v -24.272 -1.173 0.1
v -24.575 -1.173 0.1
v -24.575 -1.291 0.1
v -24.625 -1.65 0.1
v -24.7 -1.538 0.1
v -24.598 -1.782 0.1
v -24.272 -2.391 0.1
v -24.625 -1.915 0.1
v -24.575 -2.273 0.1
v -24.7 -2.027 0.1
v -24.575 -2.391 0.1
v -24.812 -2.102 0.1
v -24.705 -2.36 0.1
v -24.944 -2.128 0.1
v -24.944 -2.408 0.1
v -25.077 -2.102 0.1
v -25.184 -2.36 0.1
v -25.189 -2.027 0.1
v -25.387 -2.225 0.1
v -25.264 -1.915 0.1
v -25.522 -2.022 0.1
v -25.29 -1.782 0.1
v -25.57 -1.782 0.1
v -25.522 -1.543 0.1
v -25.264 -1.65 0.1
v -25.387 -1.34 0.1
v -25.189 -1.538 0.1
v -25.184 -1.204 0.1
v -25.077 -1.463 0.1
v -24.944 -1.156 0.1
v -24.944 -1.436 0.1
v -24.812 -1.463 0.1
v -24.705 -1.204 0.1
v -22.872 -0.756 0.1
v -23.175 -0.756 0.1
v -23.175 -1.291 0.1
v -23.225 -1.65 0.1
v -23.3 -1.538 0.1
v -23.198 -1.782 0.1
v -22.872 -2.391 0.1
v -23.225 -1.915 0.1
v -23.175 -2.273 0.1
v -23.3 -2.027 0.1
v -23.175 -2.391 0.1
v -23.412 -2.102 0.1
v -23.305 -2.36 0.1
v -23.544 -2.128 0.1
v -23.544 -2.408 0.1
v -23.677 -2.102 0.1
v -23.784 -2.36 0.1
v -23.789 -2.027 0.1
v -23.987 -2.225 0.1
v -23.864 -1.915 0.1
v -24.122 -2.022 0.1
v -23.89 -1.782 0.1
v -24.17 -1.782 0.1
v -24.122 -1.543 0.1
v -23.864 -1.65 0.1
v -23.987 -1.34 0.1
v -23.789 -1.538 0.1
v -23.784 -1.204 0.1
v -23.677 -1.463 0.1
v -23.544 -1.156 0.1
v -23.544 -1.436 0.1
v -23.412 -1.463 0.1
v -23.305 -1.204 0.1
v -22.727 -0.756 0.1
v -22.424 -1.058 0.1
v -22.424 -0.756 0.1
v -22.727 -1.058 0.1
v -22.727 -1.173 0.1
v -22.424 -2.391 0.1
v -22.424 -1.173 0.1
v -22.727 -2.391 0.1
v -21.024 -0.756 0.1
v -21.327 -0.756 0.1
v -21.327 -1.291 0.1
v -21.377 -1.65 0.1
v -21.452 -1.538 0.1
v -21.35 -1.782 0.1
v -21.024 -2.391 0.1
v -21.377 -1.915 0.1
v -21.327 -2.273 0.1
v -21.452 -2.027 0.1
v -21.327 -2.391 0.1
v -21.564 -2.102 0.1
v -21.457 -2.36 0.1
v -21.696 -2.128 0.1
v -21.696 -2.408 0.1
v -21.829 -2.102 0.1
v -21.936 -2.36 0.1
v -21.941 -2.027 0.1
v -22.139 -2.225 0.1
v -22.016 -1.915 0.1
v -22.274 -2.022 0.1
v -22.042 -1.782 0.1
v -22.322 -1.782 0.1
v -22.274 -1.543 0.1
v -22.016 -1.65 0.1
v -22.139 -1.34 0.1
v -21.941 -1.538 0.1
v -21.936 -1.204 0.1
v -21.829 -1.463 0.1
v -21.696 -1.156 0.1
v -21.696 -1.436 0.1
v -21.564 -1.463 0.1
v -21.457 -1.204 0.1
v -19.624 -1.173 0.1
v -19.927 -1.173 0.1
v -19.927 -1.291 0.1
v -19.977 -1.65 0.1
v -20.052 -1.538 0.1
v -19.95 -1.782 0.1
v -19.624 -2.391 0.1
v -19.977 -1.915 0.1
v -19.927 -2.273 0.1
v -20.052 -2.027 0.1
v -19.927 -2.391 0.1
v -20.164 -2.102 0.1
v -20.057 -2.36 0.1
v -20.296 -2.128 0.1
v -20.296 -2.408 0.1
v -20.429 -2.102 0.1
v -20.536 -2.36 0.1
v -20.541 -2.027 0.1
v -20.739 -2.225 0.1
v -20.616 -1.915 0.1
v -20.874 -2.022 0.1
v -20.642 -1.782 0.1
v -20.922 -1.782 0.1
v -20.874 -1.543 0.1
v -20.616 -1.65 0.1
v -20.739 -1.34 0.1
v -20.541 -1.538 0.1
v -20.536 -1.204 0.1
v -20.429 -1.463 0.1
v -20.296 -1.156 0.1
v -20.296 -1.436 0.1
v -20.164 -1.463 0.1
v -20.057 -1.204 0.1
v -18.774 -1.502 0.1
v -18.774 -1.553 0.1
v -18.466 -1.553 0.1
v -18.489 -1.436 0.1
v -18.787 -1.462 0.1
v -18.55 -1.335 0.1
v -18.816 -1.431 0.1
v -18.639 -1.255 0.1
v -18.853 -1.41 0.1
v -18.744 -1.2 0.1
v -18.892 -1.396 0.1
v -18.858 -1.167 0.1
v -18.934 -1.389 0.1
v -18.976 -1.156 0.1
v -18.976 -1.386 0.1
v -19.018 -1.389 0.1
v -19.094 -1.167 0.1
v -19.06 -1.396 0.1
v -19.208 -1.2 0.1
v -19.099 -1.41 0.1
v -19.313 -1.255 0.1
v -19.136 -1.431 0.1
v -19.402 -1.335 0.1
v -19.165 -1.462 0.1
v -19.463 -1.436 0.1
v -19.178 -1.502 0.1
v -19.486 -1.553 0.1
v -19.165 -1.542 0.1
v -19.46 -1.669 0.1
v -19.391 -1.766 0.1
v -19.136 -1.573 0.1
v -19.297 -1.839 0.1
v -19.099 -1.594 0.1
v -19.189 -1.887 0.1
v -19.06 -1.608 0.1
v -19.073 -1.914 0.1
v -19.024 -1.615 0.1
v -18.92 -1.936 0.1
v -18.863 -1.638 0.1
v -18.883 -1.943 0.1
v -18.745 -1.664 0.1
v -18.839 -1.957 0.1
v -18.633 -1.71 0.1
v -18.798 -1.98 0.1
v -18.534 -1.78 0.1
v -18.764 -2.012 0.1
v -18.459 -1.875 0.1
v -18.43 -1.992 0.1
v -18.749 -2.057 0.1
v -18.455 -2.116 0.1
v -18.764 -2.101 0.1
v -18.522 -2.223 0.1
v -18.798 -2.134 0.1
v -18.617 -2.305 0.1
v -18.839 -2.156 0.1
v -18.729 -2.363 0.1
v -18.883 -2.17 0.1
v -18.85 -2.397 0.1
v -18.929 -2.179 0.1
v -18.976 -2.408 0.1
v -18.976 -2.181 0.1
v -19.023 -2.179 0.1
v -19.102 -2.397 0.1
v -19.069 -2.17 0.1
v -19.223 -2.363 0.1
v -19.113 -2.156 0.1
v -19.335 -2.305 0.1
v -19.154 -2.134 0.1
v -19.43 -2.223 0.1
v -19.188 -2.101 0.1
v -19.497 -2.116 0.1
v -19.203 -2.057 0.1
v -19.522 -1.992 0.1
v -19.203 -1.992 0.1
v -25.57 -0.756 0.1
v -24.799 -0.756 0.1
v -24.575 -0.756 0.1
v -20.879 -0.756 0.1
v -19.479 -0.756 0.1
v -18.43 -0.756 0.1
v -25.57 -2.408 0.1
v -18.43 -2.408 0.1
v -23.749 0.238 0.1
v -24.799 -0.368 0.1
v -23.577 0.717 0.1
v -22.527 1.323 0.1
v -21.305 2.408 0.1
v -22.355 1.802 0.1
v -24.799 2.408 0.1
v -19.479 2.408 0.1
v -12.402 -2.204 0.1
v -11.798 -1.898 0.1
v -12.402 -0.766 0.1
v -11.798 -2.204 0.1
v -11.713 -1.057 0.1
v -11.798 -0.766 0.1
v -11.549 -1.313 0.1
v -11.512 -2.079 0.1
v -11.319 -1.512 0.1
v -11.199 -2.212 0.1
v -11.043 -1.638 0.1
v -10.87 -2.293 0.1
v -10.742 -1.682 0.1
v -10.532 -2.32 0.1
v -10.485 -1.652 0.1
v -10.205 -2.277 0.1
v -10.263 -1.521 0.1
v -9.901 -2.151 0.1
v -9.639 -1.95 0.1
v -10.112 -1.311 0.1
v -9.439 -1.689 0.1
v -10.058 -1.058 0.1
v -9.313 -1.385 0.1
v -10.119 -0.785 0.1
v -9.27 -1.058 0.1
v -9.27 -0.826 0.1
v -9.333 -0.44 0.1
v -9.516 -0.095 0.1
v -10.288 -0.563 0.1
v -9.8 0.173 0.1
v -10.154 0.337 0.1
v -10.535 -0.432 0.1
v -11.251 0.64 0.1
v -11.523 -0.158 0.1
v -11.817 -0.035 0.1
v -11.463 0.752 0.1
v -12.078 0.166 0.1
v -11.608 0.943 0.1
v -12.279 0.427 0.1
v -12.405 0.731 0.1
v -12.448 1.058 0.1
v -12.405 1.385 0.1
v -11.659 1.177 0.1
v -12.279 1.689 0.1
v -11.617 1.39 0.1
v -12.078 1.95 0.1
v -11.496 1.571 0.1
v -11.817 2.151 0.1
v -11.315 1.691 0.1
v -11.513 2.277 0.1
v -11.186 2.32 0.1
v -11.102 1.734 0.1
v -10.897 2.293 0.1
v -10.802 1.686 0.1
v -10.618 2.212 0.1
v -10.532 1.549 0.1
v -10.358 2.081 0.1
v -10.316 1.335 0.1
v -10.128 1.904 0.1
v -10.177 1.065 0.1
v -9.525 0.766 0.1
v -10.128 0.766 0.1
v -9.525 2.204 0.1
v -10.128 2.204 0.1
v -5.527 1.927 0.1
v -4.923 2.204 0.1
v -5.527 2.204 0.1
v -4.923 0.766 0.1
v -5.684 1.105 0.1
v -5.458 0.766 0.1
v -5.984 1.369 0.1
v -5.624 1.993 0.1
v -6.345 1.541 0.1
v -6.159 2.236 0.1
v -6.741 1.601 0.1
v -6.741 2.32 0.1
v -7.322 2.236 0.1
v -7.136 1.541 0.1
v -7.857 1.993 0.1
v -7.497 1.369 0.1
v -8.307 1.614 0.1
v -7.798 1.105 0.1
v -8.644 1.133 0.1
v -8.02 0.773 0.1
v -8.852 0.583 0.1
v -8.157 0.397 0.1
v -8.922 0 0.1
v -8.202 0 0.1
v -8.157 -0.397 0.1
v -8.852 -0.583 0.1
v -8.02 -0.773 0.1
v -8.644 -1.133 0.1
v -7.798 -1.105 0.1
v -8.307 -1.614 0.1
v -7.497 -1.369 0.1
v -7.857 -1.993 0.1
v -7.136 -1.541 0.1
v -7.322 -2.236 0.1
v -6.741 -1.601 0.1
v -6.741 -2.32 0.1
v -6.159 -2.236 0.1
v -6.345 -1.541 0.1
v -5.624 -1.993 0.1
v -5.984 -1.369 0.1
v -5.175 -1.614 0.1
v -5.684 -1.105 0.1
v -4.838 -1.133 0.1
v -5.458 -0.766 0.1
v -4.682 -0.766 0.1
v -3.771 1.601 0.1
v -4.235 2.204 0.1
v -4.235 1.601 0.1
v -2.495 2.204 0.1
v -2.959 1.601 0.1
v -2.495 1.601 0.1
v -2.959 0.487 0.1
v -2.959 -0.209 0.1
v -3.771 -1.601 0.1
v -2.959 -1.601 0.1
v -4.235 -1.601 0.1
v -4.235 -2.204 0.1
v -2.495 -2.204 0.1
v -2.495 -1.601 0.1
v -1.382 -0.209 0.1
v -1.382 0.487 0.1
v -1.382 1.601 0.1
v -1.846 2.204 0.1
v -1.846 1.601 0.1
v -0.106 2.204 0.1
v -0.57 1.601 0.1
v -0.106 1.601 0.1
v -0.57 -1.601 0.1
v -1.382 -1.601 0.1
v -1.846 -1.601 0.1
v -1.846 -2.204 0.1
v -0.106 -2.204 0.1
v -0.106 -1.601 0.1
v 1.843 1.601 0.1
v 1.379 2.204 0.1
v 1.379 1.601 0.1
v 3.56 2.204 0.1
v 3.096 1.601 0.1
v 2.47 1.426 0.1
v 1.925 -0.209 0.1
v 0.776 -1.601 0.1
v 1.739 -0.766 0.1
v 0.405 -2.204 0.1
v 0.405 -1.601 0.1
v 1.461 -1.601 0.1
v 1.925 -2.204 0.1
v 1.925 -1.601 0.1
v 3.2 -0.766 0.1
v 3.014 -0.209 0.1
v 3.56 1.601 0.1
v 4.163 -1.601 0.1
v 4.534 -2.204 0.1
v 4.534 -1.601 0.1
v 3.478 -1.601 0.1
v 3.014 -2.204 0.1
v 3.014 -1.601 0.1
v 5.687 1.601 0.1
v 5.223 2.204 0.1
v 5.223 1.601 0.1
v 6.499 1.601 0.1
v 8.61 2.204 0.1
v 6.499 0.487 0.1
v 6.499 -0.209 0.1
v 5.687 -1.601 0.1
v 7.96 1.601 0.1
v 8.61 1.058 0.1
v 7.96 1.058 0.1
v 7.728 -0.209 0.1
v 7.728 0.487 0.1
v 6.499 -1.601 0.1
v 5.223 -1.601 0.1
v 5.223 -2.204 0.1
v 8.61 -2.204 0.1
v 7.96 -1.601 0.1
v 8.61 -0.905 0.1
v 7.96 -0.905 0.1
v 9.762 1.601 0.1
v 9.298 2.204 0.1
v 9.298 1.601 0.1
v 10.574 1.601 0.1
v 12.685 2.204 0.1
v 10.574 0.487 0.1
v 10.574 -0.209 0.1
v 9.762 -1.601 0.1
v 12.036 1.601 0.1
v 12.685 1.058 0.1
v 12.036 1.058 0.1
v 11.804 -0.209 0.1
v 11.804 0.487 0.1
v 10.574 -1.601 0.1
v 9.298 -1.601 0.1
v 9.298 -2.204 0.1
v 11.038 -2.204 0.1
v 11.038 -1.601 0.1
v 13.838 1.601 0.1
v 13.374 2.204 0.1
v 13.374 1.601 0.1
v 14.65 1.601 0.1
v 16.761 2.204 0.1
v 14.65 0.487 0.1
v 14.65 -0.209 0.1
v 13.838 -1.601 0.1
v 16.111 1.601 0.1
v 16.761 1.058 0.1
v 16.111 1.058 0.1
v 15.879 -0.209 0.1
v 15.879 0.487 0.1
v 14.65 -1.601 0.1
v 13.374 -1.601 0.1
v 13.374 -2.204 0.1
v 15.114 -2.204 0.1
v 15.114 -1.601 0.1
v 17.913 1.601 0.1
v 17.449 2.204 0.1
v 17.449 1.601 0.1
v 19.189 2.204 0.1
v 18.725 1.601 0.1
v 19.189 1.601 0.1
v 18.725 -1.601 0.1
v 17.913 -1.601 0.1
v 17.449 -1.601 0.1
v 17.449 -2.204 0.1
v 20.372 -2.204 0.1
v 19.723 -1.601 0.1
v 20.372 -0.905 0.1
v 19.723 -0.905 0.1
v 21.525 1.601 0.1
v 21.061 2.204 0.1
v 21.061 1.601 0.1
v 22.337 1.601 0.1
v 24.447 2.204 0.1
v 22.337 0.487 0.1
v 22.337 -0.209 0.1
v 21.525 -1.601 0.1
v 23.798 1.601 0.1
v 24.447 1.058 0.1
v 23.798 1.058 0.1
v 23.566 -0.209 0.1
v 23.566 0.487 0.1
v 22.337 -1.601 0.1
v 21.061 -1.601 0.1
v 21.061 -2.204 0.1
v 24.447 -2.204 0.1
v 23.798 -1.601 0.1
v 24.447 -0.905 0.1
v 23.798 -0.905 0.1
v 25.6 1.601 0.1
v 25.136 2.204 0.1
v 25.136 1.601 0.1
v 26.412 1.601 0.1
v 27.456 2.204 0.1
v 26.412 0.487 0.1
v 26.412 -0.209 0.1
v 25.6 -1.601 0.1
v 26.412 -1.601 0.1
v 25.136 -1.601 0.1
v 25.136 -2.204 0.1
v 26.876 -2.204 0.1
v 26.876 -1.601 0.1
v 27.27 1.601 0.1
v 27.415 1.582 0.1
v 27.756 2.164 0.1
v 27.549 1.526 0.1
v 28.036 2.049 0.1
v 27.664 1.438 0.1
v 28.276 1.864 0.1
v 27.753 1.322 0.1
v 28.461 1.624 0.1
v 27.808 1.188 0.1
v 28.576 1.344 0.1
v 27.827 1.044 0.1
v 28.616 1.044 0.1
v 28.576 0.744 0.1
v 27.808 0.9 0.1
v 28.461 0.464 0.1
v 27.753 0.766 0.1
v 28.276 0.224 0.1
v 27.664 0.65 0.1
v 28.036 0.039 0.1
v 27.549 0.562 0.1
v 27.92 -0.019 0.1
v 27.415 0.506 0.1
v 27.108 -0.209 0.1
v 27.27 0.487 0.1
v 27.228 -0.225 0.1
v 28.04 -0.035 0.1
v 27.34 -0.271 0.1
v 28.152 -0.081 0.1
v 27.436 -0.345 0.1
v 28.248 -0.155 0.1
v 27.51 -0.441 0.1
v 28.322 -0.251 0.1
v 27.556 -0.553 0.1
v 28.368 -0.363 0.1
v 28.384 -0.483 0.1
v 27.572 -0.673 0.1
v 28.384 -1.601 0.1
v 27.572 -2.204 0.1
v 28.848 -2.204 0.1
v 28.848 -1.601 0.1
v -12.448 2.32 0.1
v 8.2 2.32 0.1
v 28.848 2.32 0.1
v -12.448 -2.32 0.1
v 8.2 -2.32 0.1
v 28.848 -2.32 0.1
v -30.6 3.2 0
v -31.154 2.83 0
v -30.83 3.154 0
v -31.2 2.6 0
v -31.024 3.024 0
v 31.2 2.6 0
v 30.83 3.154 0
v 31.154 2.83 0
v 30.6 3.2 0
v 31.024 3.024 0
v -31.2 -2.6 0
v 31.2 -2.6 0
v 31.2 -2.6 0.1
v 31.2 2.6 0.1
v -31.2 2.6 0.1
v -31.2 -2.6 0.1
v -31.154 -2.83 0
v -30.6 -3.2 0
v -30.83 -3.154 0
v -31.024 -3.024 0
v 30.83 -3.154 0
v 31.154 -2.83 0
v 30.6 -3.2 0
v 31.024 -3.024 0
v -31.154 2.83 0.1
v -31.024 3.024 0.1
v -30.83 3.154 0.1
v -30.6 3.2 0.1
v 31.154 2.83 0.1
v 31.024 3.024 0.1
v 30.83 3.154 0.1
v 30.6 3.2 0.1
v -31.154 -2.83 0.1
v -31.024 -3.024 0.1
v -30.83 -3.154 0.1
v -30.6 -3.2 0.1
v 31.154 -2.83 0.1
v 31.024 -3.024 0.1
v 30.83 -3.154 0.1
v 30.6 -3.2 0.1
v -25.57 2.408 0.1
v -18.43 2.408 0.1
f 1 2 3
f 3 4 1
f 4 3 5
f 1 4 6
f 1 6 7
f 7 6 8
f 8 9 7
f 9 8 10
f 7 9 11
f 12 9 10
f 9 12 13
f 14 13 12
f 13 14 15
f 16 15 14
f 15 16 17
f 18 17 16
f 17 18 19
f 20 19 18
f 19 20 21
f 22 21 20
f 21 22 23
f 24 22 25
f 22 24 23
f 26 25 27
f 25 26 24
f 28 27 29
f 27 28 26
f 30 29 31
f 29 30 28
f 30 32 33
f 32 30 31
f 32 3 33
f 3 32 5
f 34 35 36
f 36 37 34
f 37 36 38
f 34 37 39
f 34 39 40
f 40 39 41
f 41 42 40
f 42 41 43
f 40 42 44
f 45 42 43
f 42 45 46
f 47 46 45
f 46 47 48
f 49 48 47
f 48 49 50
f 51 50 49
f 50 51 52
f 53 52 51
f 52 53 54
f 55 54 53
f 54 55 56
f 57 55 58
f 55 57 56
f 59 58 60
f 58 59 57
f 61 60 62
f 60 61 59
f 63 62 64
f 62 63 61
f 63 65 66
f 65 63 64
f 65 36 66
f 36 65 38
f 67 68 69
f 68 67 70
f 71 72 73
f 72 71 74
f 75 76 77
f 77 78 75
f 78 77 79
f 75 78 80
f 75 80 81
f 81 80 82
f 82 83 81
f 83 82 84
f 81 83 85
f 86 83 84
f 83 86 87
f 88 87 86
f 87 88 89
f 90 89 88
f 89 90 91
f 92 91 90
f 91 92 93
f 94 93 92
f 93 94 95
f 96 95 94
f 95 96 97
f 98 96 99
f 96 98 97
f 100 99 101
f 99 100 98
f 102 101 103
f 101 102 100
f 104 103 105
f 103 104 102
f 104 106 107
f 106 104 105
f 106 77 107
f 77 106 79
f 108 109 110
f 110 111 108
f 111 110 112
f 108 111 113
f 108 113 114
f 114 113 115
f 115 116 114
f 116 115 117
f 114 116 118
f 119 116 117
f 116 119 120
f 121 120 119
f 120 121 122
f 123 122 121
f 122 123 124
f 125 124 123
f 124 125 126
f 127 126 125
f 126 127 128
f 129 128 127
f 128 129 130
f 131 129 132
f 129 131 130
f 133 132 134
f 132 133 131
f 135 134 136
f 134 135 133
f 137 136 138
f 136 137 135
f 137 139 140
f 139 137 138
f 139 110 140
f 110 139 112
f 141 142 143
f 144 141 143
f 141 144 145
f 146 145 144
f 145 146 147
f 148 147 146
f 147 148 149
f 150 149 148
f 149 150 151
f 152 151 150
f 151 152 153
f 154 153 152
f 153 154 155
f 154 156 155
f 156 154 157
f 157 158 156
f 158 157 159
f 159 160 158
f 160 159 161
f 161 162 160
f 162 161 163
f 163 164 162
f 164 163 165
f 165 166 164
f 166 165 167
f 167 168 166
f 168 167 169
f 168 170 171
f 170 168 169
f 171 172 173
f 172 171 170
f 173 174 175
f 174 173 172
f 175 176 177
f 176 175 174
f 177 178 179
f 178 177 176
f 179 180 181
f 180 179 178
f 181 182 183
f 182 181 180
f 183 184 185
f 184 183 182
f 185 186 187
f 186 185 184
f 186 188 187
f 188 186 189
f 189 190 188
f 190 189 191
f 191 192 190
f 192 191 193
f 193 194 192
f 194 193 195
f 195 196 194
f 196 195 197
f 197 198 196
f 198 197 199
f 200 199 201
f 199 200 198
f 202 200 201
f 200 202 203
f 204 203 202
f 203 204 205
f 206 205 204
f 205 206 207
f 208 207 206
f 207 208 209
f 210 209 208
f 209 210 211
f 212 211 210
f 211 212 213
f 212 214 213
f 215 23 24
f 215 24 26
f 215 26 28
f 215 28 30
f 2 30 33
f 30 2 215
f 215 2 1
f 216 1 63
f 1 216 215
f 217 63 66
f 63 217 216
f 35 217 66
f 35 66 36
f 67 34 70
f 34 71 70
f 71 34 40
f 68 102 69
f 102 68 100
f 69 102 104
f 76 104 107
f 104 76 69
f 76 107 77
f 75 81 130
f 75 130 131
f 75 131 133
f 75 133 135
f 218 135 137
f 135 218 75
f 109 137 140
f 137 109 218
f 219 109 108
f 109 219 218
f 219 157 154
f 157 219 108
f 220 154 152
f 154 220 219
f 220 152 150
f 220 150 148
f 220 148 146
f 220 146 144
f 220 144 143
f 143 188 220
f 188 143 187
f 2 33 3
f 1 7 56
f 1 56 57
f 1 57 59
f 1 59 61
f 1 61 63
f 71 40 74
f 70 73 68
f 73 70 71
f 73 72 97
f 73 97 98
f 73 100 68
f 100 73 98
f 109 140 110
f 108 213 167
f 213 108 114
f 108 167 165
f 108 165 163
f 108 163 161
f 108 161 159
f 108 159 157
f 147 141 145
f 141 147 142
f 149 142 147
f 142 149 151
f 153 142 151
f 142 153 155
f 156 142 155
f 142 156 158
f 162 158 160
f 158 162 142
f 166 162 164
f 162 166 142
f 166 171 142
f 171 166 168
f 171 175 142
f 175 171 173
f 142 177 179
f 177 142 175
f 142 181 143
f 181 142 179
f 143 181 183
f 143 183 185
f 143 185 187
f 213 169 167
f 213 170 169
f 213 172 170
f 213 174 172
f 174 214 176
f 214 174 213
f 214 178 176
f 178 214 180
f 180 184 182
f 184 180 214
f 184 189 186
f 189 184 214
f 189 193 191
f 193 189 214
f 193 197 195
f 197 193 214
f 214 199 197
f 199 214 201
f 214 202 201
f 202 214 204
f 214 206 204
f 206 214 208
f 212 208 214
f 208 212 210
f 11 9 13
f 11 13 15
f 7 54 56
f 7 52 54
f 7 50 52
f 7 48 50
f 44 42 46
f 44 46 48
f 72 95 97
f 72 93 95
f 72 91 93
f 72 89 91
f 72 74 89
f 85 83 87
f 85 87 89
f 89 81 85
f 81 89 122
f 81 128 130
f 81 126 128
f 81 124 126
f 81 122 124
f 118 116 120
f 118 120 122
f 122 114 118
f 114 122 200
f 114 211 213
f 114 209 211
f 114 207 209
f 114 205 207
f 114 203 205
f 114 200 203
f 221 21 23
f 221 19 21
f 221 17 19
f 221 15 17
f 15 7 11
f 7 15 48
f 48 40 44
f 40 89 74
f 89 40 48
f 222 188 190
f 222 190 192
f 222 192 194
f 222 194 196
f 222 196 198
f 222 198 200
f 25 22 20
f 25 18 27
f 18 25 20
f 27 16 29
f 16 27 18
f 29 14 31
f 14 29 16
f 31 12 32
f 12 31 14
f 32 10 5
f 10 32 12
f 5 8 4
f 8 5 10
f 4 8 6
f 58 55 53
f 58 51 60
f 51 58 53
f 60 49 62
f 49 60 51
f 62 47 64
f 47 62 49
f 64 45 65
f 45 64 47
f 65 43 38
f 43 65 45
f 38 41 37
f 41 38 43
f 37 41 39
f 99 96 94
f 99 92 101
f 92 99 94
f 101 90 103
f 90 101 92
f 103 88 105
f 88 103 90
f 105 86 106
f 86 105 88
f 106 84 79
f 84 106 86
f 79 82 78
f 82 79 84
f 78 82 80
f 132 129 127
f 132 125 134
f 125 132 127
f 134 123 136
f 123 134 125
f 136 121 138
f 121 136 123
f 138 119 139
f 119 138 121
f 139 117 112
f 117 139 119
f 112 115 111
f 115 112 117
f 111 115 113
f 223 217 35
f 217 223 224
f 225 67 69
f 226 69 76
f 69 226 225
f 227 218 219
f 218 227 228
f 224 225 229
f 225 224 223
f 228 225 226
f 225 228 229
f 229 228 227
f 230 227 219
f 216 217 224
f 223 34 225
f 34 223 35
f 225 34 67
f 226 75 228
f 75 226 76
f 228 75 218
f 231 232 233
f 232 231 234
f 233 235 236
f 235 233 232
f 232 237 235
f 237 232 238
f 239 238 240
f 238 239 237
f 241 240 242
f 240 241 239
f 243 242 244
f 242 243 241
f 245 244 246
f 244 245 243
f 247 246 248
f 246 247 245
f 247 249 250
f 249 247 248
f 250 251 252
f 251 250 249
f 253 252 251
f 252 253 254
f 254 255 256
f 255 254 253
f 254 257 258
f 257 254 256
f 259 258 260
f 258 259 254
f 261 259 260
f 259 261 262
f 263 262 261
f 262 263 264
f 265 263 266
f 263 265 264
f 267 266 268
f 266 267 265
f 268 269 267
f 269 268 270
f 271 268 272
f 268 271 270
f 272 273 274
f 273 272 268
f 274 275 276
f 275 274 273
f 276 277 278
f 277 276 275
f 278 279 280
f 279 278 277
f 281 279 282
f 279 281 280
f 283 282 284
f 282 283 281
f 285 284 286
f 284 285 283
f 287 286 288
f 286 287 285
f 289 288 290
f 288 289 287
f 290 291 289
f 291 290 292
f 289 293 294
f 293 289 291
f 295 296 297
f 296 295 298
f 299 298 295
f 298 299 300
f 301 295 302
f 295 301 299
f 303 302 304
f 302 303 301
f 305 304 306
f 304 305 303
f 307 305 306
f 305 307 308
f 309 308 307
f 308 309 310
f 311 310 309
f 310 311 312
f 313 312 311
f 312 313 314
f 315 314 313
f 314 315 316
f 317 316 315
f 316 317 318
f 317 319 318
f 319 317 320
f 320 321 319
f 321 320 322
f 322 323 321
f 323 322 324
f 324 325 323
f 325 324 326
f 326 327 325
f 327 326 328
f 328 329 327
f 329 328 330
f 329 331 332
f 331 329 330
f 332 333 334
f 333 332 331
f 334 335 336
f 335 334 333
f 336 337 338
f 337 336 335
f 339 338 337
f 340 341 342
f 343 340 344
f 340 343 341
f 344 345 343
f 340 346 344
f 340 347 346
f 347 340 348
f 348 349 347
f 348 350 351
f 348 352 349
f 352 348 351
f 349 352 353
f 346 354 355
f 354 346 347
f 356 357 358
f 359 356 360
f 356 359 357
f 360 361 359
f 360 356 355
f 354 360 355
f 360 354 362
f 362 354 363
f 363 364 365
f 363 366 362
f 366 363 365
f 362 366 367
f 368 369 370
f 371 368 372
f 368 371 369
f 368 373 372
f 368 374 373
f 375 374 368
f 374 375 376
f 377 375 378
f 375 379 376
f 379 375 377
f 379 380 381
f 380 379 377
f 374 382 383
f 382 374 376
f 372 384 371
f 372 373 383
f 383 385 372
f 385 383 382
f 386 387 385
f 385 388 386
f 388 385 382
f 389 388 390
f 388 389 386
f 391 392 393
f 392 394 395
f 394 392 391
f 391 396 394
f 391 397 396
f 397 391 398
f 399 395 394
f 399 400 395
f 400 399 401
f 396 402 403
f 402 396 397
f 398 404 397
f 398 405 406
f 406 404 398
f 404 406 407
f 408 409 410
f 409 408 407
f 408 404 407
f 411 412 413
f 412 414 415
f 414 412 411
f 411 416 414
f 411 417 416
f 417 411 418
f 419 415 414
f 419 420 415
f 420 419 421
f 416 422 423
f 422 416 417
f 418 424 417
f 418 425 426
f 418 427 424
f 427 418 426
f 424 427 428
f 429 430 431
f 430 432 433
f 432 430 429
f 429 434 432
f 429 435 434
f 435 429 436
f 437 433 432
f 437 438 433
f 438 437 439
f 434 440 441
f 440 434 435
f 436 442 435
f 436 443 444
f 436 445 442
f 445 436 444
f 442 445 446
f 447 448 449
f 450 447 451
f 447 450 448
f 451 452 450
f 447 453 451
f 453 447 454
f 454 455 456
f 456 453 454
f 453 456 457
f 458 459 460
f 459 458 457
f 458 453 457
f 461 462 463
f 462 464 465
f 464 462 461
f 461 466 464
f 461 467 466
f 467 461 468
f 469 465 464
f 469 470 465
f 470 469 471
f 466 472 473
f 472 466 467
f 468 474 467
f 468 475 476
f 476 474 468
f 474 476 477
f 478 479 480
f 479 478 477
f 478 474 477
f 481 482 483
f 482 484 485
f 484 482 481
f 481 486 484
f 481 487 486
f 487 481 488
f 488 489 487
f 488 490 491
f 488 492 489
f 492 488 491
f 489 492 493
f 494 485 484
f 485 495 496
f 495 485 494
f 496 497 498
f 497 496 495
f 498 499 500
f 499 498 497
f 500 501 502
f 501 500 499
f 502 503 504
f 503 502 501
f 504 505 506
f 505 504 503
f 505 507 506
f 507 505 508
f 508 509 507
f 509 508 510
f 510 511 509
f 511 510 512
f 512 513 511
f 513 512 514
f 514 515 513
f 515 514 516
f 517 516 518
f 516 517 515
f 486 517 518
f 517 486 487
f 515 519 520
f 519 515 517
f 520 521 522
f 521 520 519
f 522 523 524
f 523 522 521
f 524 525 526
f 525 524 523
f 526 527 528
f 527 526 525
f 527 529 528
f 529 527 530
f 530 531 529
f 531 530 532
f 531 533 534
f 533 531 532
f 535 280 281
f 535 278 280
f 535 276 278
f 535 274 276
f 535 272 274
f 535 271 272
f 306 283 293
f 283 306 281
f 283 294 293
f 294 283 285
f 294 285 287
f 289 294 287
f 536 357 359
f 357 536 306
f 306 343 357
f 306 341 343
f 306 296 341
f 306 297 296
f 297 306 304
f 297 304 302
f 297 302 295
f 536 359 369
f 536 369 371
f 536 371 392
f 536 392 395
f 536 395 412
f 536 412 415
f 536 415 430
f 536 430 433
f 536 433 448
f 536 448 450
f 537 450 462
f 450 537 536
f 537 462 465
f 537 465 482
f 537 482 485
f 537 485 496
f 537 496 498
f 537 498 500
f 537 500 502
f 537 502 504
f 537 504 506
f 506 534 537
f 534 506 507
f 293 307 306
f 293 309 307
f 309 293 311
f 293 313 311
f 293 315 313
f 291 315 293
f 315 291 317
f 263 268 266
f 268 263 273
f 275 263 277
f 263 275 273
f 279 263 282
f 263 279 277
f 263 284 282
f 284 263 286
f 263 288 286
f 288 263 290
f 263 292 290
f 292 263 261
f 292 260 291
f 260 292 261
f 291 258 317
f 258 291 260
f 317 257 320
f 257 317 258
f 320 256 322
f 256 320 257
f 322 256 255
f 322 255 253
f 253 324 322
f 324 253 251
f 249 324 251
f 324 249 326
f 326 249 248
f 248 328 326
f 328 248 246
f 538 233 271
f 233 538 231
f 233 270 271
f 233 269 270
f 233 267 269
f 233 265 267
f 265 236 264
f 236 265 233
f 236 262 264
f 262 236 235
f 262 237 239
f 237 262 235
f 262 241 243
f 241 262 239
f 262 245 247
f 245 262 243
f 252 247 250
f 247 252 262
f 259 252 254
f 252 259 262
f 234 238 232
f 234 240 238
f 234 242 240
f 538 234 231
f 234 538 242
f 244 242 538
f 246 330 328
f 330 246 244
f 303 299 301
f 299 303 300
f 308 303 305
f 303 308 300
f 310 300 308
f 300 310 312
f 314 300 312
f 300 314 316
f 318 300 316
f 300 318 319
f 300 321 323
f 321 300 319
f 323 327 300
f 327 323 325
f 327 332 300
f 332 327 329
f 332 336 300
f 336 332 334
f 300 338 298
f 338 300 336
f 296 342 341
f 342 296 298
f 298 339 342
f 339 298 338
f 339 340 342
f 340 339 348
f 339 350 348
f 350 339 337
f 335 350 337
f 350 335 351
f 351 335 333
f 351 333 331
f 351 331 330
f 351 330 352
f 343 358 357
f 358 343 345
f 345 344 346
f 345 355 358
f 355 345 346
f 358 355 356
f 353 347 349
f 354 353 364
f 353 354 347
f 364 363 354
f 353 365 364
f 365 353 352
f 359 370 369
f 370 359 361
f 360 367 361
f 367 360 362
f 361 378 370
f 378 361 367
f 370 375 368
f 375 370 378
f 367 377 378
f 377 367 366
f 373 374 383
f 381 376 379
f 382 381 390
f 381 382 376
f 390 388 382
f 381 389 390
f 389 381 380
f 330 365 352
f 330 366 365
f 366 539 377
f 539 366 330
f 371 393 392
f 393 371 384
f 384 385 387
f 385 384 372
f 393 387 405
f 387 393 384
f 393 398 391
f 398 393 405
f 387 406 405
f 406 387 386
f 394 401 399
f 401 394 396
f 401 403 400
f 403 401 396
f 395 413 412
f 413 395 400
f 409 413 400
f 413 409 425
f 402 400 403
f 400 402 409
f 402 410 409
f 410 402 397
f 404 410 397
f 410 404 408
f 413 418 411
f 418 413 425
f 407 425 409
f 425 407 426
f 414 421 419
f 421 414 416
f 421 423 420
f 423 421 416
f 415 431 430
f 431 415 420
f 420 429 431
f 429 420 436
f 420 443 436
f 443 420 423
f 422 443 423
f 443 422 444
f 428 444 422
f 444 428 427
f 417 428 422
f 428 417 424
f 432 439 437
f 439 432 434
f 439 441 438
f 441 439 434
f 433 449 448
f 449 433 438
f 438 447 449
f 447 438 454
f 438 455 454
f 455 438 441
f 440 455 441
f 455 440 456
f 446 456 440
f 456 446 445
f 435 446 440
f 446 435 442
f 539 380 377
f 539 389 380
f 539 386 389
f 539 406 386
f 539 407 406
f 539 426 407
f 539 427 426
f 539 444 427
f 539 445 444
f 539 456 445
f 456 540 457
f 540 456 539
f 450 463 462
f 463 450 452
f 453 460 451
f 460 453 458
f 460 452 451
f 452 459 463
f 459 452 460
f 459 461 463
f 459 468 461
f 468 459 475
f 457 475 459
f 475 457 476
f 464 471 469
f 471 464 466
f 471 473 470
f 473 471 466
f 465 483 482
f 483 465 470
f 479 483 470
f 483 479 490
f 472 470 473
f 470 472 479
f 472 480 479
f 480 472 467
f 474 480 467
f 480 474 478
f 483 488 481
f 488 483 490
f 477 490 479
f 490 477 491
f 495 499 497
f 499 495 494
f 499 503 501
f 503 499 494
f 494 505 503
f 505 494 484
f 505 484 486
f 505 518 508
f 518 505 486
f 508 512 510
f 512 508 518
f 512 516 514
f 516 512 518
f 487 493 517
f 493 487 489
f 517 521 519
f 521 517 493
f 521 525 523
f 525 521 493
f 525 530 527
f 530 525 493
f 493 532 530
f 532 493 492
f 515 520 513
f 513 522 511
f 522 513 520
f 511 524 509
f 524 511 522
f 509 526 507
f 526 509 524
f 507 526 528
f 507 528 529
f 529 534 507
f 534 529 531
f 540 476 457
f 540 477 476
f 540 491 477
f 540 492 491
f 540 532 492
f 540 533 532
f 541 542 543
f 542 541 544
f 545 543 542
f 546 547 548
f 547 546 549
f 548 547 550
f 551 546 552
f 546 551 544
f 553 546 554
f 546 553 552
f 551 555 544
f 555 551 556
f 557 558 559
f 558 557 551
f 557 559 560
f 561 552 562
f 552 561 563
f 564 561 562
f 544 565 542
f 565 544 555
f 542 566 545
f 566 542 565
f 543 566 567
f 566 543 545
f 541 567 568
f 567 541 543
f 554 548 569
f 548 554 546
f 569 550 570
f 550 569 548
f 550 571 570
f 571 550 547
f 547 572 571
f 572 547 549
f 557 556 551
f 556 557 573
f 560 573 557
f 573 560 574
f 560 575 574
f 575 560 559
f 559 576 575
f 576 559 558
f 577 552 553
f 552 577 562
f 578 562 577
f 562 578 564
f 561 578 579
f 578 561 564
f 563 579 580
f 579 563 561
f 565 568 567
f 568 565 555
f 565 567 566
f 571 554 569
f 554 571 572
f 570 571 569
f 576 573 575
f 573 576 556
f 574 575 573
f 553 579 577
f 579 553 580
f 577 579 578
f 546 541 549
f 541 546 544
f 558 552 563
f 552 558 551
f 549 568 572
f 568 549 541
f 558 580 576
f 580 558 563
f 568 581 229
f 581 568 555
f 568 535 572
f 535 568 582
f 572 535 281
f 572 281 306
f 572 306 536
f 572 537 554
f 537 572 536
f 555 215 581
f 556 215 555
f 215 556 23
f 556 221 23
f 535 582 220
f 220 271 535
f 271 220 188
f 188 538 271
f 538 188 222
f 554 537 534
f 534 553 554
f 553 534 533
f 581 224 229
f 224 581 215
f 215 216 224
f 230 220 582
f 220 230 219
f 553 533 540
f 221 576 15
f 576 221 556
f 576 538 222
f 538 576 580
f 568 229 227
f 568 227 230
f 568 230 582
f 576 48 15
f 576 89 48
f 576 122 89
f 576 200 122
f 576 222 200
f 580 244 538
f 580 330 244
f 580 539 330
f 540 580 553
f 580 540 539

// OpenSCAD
use <../lib.scad>
use <../p/1-4chrd.scad>
use <../p/1-4cyli.scad>
use <../p/box3u12.scad>
use <../p/logo-adidas-box.scad>
use <../p/logo-adidas-text-box.scad>
use <../p/logo-adidas-text.scad>
use <../p/logo-adidas.scad>
use <../p/logo-schaeffler-text-box.scad>
use <../p/logo-schaeffler-text.scad>
function ldraw_lib__6148328m() = [
// 0 Sticker  0.8 x  7.8 with White Adidas and Schaeffler Logos on Dark Grey Background
// 0 Name: 6148328m.dat
// 0 Author: Massimo Maso [Sirio]
// 0 !LDRAW_ORG Part UPDATE 2025-03
// 0 !LICENSE Licensed under CC BY 4.0 : see CAreadme.txt
// 
// 0 BFC CERTIFY CCW
  [0,"BFC","CERTIFY"],
  [0,"BFC","CCW"],
// 
// 0 !KEYWORDS 917K, 919, Bricklink 75876stk01, Brickowl 852010, Hybrid, Pit Lane
// 0 !KEYWORDS Porsche, Rebrickable 26357, set 75876, Speed Champions
// 
// 0 !HISTORY 2025-03-30 [OrionP] Official Update 2025-03
// 
// 0 // Logo primitives
// 1 15 -55 -.25 -3.955 .7 0 0 0 1 0 0 0 .7 logo-adidas-text.dat
  [1,15,-55,-.25,-3.955,.7,0,0,0,1,0,0,0,.7, ldraw_lib__logo_adidas_text()],
// 1 72 -55 -.25 -3.955 .7 0 0 0 1 0 0 0 .7 logo-adidas-text-box.dat
  [1,72,-55,-.25,-3.955,.7,0,0,0,1,0,0,0,.7, ldraw_lib__logo_adidas_text_box()],
// 1 15 -55.3465 -.25 2.065 .7 0 0 0 1 0 0 0 .7 logo-adidas.dat
  [1,15,-55.3465,-.25,2.065,.7,0,0,0,1,0,0,0,.7, ldraw_lib__logo_adidas()],
// 1 72 -55.3465 -.25 2.065 .7 0 0 0 1 0 0 0 .7 logo-adidas-box.dat
  [1,72,-55.3465,-.25,2.065,.7,0,0,0,1,0,0,0,.7, ldraw_lib__logo_adidas_box()],
// 1 15 20.5 -.25 0 1.16 0 0 0 1 0 0 0 1.16 logo-schaeffler-text.dat
  [1,15,20.5,-.25,0,1.16,0,0,0,1,0,0,0,1.16, ldraw_lib__logo_schaeffler_text()],
// 1 72 20.5 -.25 0 1.16 0 0 0 1 0 0 0 1.16 logo-schaeffler-text-box.dat
  [1,72,20.5,-.25,0,1.16,0,0,0,1,0,0,0,1.16, ldraw_lib__logo_schaeffler_text_box()],
// 0 // Primitives
// 1 16 -76.5 0 6.5 -1.5 0 0 0 -1 0 0 0 1.5 1-4chrd.dat
  [1,16,-76.5,0,6.5,-1.5,0,0,0,-1,0,0,0,1.5, ldraw_lib__1_4chrd()],
// 1 16 76.5 0 6.5 1.5 0 0 0 -1 0 0 0 1.5 1-4chrd.dat
  [1,16,76.5,0,6.5,1.5,0,0,0,-1,0,0,0,1.5, ldraw_lib__1_4chrd()],
// 1 16 0 -.25 0 0 0 78 0 .25 0 6.5 0 0 box3u12.dat
  [1,16,0,-.25,0,0,0,78,0,.25,0,6.5,0,0, ldraw_lib__box3u12()],
// 1 16 -76.5 0 -6.5 -1.5 0 0 0 -1 0 0 0 -1.5 1-4chrd.dat
  [1,16,-76.5,0,-6.5,-1.5,0,0,0,-1,0,0,0,-1.5, ldraw_lib__1_4chrd()],
// 1 16 76.5 0 -6.5 1.5 0 0 0 -1 0 0 0 -1.5 1-4chrd.dat
  [1,16,76.5,0,-6.5,1.5,0,0,0,-1,0,0,0,-1.5, ldraw_lib__1_4chrd()],
// 1 16 -76.5 0 6.5 -1.5 0 0 0 -.25 0 0 0 1.5 1-4cyli.dat
  [1,16,-76.5,0,6.5,-1.5,0,0,0,-.25,0,0,0,1.5, ldraw_lib__1_4cyli()],
// 1 16 76.5 0 6.5 1.5 0 0 0 -.25 0 0 0 1.5 1-4cyli.dat
  [1,16,76.5,0,6.5,1.5,0,0,0,-.25,0,0,0,1.5, ldraw_lib__1_4cyli()],
// 1 16 -76.5 0 -6.5 -1.5 0 0 0 -.25 0 0 0 -1.5 1-4cyli.dat
  [1,16,-76.5,0,-6.5,-1.5,0,0,0,-.25,0,0,0,-1.5, ldraw_lib__1_4cyli()],
// 1 16 76.5 0 -6.5 1.5 0 0 0 -.25 0 0 0 -1.5 1-4cyli.dat
  [1,16,76.5,0,-6.5,1.5,0,0,0,-.25,0,0,0,-1.5, ldraw_lib__1_4cyli()],
// 1 72 -76.5 -.25 6.5 -1.5 0 0 0 1 0 0 0 1.5 1-4chrd.dat
  [1,72,-76.5,-.25,6.5,-1.5,0,0,0,1,0,0,0,1.5, ldraw_lib__1_4chrd()],
// 1 72 76.5 -.25 6.5 1.5 0 0 0 1 0 0 0 1.5 1-4chrd.dat
  [1,72,76.5,-.25,6.5,1.5,0,0,0,1,0,0,0,1.5, ldraw_lib__1_4chrd()],
// 1 72 -76.5 -.25 -6.5 -1.5 0 0 0 1 0 0 0 -1.5 1-4chrd.dat
  [1,72,-76.5,-.25,-6.5,-1.5,0,0,0,1,0,0,0,-1.5, ldraw_lib__1_4chrd()],
// 1 72 76.5 -.25 -6.5 1.5 0 0 0 1 0 0 0 -1.5 1-4chrd.dat
  [1,72,76.5,-.25,-6.5,1.5,0,0,0,1,0,0,0,-1.5, ldraw_lib__1_4chrd()],
// 0 // Bottom faces
// 4 16 76.5 0 8 78 0 6.5 -78 0 6.5 -76.5 0 8
  [4,16,76.5,0,8,78,0,6.5,-78,0,6.5,-76.5,0,8],
// 4 16 76.5 0 -8 -76.5 0 -8 -78 0 -6.5 78 0 -6.5
  [4,16,76.5,0,-8,-76.5,0,-8,-78,0,-6.5,78,0,-6.5],
// 0 // Lateral faces
// 4 16 -76.5 0 8 -76.5 -.25 8 76.5 -.25 8 76.5 0 8
  [4,16,-76.5,0,8,-76.5,-.25,8,76.5,-.25,8,76.5,0,8],
// 4 16 -76.5 0 -8 76.5 0 -8 76.5 -.25 -8 -76.5 -.25 -8
  [4,16,-76.5,0,-8,76.5,0,-8,76.5,-.25,-8,-76.5,-.25,-8],
// 0 // Top faces
// 4 72 -76.5 -.25 8 -78 -.25 6.5 -63.925 -.25 6.02 -61.9965 -.25 6.02
  [4,72,-76.5,-.25,8,-78,-.25,6.5,-63.925,-.25,6.02,-61.9965,-.25,6.02],
// 4 72 -76.5 -.25 8 -46.075 -.25 6.02 -31.12 -.25 5.8 76.5 -.25 8
  [4,72,-76.5,-.25,8,-46.075,-.25,6.02,-31.12,-.25,5.8,76.5,-.25,8],
// 3 72 76.5 -.25 8 -31.12 -.25 5.8 -27.9648 -.25 5.8
  [3,72,76.5,-.25,8,-31.12,-.25,5.8,-27.9648,-.25,5.8],
// 3 72 76.5 -.25 8 -27.9648 -.25 5.8 -16.852 -.25 5.8
  [3,72,76.5,-.25,8,-27.9648,-.25,5.8,-16.852,-.25,5.8],
// 3 72 76.5 -.25 8 -16.852 -.25 5.8 20.5 -.25 5.8
  [3,72,76.5,-.25,8,-16.852,-.25,5.8,20.5,-.25,5.8],
// 4 72 76.5 -.25 8 20.5 -.25 5.8 72.12 -.25 5.8 78 -.25 6.5
  [4,72,76.5,-.25,8,20.5,-.25,5.8,72.12,-.25,5.8,78,-.25,6.5],
// 3 72 -78 -.25 6.5 -63.925 -.25 -1.89 -63.925 -.25 6.02
  [3,72,-78,-.25,6.5,-63.925,-.25,-1.89,-63.925,-.25,6.02],
// 4 72 -78 -.25 6.5 -78 -.25 -6.5 -63.925 -.25 -4.4555 -63.925 -.25 -1.89
  [4,72,-78,-.25,6.5,-78,-.25,-6.5,-63.925,-.25,-4.4555,-63.925,-.25,-1.89],
// 3 72 -78 -.25 -6.5 -63.925 -.25 -6.02 -63.925 -.25 -4.4555
  [3,72,-78,-.25,-6.5,-63.925,-.25,-6.02,-63.925,-.25,-4.4555],
// 3 72 -31.12 -.25 5.8 -46.075 -.25 6.02 -46.075 -.25 -1.89
  [3,72,-31.12,-.25,5.8,-46.075,-.25,6.02,-46.075,-.25,-1.89],
// 4 72 -31.12 -.25 5.8 -46.075 -.25 -1.89 -46.075 -.25 -4.9805 -31.12 -.25 2.6448
  [4,72,-31.12,-.25,5.8,-46.075,-.25,-1.89,-46.075,-.25,-4.9805,-31.12,-.25,2.6448],
// 4 72 -31.12 -.25 -5.8 -31.12 -.25 2.6448 -46.075 -.25 -4.9805 -46.075 -.25 -6.02
  [4,72,-31.12,-.25,-5.8,-31.12,-.25,2.6448,-46.075,-.25,-4.9805,-46.075,-.25,-6.02],
// 3 72 78 -.25 6.5 72.12 -.25 5.8 72.12 -.25 -4.002
  [3,72,78,-.25,6.5,72.12,-.25,5.8,72.12,-.25,-4.002],
// 4 72 78 -.25 6.5 72.12 -.25 -4.002 72.12 -.25 -5.51 78 -.25 -6.5
  [4,72,78,-.25,6.5,72.12,-.25,-4.002,72.12,-.25,-5.51,78,-.25,-6.5],
// 4 72 -63.925 -.25 -1.89 -61.9965 -.25 -.92001 -61.9965 -.25 6.02 -63.925 -.25 6.02
  [4,72,-63.925,-.25,-1.89,-61.9965,-.25,-.92001,-61.9965,-.25,6.02,-63.925,-.25,6.02],
// 3 72 -63.925 -.25 -1.89 -61.9965 -.25 -1.89 -61.9965 -.25 -.92001
  [3,72,-63.925,-.25,-1.89,-61.9965,-.25,-1.89,-61.9965,-.25,-.92001],
// 4 72 -46.075 -.25 -1.89 -46.075 -.25 6.02 -48.6965 -.25 6.02 -48.6965 -.25 -1.89
  [4,72,-46.075,-.25,-1.89,-46.075,-.25,6.02,-48.6965,-.25,6.02,-48.6965,-.25,-1.89],
// 3 72 78 -.25 -6.5 72.12 -.25 -5.51 72.12 -.25 -5.8
  [3,72,78,-.25,-6.5,72.12,-.25,-5.51,72.12,-.25,-5.8],
// 4 72 -76.5 -.25 -8 -62.3605 -.25 -6.02 -63.925 -.25 -6.02 -78 -.25 -6.5
  [4,72,-76.5,-.25,-8,-62.3605,-.25,-6.02,-63.925,-.25,-6.02,-78,-.25,-6.5],
// 4 72 -76.5 -.25 -8 76.5 -.25 -8 -31.12 -.25 -5.8 -46.075 -.25 -6.02
  [4,72,-76.5,-.25,-8,76.5,-.25,-8,-31.12,-.25,-5.8,-46.075,-.25,-6.02],
// 3 72 -76.5 -.25 8 -61.9965 -.25 6.02 -53.2633 -.25 6.02
  [3,72,-76.5,-.25,8,-61.9965,-.25,6.02,-53.2633,-.25,6.02],
// 3 72 -76.5 -.25 8 -53.2633 -.25 6.02 -48.6965 -.25 6.02
  [3,72,-76.5,-.25,8,-53.2633,-.25,6.02,-48.6965,-.25,6.02],
// 3 72 -76.5 -.25 8 -48.6965 -.25 6.02 -46.075 -.25 6.02
  [3,72,-76.5,-.25,8,-48.6965,-.25,6.02,-46.075,-.25,6.02],
// 3 72 -76.5 -.25 -8 -58.8605 -.25 -6.02 -62.3605 -.25 -6.02
  [3,72,-76.5,-.25,-8,-58.8605,-.25,-6.02,-62.3605,-.25,-6.02],
// 3 72 -76.5 -.25 -8 -54.2405 -.25 -6.02 -58.8605 -.25 -6.02
  [3,72,-76.5,-.25,-8,-54.2405,-.25,-6.02,-58.8605,-.25,-6.02],
// 3 72 -76.5 -.25 -8 -50.7405 -.25 -6.02 -54.2405 -.25 -6.02
  [3,72,-76.5,-.25,-8,-50.7405,-.25,-6.02,-54.2405,-.25,-6.02],
// 3 72 -76.5 -.25 -8 -47.44 -.25 -6.02 -50.7405 -.25 -6.02
  [3,72,-76.5,-.25,-8,-47.44,-.25,-6.02,-50.7405,-.25,-6.02],
// 3 72 -76.5 -.25 -8 -46.075 -.25 -6.02 -47.44 -.25 -6.02
  [3,72,-76.5,-.25,-8,-46.075,-.25,-6.02,-47.44,-.25,-6.02],
// 3 72 76.5 -.25 -8 -26.3292 -.25 -5.8 -31.12 -.25 -5.8
  [3,72,76.5,-.25,-8,-26.3292,-.25,-5.8,-31.12,-.25,-5.8],
// 3 72 76.5 -.25 -8 -16.852 -.25 -5.8 -26.3292 -.25 -5.8
  [3,72,76.5,-.25,-8,-16.852,-.25,-5.8,-26.3292,-.25,-5.8],
// 3 72 76.5 -.25 -8 20.5 -.25 -5.8 -16.852 -.25 -5.8
  [3,72,76.5,-.25,-8,20.5,-.25,-5.8,-16.852,-.25,-5.8],
// 4 72 76.5 -.25 -8 78 -.25 -6.5 72.12 -.25 -5.8 20.5 -.25 -5.8
  [4,72,76.5,-.25,-8,78,-.25,-6.5,72.12,-.25,-5.8,20.5,-.25,-5.8],
];
module ldraw_lib__6148328m(step=0, col=false, unit=2/5, alt=false, line=0.2, solid=!$preview)
    makepoly(ldraw_lib__6148328m(), step=step, col=col, unit=unit, alt=alt, line=line, solid=solid);
ldraw_lib__6148328m(line=0.2);
